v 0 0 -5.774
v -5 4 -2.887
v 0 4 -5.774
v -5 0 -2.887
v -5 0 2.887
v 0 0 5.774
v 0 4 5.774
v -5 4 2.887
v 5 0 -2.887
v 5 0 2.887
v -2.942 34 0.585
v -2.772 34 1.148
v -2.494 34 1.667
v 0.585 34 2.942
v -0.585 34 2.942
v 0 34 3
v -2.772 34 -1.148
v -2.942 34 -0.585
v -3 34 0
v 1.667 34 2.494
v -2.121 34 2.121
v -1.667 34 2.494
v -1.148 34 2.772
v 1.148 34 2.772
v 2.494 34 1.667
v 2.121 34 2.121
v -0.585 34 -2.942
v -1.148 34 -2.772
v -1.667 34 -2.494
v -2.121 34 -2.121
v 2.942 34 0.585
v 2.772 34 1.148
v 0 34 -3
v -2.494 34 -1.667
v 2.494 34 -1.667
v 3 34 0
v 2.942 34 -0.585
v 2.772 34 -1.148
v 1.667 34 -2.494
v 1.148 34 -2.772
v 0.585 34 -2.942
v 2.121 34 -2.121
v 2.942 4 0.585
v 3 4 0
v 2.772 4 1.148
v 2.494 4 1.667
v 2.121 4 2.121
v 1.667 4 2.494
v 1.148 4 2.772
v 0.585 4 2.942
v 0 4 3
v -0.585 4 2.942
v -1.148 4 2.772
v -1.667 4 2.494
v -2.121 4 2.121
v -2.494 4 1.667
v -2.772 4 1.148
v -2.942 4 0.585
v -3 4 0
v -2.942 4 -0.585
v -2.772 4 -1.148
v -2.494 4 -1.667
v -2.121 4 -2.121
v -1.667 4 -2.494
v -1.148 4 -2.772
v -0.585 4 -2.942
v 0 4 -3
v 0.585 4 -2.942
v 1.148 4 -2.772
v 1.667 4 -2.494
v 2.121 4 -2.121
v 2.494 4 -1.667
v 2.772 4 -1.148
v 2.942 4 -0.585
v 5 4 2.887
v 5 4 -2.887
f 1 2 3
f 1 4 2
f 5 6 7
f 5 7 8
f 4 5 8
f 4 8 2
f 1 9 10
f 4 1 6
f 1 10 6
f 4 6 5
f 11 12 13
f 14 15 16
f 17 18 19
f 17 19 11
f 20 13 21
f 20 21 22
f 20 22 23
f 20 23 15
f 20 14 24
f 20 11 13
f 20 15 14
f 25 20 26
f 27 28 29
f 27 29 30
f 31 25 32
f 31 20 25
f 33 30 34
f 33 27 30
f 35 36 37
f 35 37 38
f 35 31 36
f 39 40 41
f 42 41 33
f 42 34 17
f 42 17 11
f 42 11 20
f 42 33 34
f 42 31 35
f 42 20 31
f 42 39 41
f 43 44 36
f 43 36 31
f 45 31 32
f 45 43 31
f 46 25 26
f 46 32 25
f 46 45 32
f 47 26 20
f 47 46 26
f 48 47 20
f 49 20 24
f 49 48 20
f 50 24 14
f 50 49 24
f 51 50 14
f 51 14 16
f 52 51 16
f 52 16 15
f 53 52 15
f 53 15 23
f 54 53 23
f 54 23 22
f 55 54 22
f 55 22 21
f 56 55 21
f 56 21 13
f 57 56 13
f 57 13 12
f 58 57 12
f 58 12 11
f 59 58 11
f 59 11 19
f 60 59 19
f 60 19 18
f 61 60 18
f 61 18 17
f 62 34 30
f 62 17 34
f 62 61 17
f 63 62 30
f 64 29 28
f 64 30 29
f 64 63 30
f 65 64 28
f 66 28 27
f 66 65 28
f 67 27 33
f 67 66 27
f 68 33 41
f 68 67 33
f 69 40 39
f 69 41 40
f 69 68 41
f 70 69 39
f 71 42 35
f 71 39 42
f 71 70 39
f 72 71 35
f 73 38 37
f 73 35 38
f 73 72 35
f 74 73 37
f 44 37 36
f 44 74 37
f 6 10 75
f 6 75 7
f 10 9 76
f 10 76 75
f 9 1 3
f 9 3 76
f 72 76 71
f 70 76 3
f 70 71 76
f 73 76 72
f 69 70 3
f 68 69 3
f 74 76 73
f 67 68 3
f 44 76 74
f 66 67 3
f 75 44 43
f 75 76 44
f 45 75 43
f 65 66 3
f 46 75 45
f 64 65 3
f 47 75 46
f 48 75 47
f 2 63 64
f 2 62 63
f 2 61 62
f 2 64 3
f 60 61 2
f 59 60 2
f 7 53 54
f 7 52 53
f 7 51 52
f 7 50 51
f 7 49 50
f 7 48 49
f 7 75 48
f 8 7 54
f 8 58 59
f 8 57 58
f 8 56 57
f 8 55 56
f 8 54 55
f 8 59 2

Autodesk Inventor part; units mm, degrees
ref_plane "YZ Plane" through (0, 0, 0) normal (1, 0, 0) x (0, 1, 0)
ref_plane "XZ Plane" through (0, 0, 0) normal (0, 1, 0) x (-1, 0, 0)
ref_plane "XY Plane" through (0, 0, 0) normal (0, 0, 1) x (1, 0, 0)
sketch "Schizzo1" plane through (0, 0, 0) normal (0, 1, 0) x (-1, 0, 0)
  circle A0 centre (0, 0) radius 5
  line L0 (5, -2.8868) -> (0, -5.7735)
  line L1 (0, -5.7735) -> (-5, -2.8868)
  line L2 (-5, -2.8868) -> (-5, 2.8868)
  line L3 (-5, 2.8868) -> (0, 5.7735)
  line L4 (0, 5.7735) -> (5, 2.8868)
  line L5 (5, 2.8868) -> (5, -2.8868)
  point P0 (5, 0)
  dimension "d0" = 10
extrude "Estrusione1" add sketch "Schizzo1" along normal blind 4
sketch "Schizzo2" plane through (0, 4, 0) normal (0, 1, 0) x (1, 0, 0)
  circle A0 centre (0, 0) radius 3
  dimension "d3" = 6
extrude "Estrusione2" add sketch "Schizzo2" along normal blind 30
thread "Filettatura1" size "M6x1" class "6g" standard "ANSI Metric M Profile" length 100
properties part number "27_Vite_M6_30_Testa_Esagonale" material "Acciaio inox AISI 316"
